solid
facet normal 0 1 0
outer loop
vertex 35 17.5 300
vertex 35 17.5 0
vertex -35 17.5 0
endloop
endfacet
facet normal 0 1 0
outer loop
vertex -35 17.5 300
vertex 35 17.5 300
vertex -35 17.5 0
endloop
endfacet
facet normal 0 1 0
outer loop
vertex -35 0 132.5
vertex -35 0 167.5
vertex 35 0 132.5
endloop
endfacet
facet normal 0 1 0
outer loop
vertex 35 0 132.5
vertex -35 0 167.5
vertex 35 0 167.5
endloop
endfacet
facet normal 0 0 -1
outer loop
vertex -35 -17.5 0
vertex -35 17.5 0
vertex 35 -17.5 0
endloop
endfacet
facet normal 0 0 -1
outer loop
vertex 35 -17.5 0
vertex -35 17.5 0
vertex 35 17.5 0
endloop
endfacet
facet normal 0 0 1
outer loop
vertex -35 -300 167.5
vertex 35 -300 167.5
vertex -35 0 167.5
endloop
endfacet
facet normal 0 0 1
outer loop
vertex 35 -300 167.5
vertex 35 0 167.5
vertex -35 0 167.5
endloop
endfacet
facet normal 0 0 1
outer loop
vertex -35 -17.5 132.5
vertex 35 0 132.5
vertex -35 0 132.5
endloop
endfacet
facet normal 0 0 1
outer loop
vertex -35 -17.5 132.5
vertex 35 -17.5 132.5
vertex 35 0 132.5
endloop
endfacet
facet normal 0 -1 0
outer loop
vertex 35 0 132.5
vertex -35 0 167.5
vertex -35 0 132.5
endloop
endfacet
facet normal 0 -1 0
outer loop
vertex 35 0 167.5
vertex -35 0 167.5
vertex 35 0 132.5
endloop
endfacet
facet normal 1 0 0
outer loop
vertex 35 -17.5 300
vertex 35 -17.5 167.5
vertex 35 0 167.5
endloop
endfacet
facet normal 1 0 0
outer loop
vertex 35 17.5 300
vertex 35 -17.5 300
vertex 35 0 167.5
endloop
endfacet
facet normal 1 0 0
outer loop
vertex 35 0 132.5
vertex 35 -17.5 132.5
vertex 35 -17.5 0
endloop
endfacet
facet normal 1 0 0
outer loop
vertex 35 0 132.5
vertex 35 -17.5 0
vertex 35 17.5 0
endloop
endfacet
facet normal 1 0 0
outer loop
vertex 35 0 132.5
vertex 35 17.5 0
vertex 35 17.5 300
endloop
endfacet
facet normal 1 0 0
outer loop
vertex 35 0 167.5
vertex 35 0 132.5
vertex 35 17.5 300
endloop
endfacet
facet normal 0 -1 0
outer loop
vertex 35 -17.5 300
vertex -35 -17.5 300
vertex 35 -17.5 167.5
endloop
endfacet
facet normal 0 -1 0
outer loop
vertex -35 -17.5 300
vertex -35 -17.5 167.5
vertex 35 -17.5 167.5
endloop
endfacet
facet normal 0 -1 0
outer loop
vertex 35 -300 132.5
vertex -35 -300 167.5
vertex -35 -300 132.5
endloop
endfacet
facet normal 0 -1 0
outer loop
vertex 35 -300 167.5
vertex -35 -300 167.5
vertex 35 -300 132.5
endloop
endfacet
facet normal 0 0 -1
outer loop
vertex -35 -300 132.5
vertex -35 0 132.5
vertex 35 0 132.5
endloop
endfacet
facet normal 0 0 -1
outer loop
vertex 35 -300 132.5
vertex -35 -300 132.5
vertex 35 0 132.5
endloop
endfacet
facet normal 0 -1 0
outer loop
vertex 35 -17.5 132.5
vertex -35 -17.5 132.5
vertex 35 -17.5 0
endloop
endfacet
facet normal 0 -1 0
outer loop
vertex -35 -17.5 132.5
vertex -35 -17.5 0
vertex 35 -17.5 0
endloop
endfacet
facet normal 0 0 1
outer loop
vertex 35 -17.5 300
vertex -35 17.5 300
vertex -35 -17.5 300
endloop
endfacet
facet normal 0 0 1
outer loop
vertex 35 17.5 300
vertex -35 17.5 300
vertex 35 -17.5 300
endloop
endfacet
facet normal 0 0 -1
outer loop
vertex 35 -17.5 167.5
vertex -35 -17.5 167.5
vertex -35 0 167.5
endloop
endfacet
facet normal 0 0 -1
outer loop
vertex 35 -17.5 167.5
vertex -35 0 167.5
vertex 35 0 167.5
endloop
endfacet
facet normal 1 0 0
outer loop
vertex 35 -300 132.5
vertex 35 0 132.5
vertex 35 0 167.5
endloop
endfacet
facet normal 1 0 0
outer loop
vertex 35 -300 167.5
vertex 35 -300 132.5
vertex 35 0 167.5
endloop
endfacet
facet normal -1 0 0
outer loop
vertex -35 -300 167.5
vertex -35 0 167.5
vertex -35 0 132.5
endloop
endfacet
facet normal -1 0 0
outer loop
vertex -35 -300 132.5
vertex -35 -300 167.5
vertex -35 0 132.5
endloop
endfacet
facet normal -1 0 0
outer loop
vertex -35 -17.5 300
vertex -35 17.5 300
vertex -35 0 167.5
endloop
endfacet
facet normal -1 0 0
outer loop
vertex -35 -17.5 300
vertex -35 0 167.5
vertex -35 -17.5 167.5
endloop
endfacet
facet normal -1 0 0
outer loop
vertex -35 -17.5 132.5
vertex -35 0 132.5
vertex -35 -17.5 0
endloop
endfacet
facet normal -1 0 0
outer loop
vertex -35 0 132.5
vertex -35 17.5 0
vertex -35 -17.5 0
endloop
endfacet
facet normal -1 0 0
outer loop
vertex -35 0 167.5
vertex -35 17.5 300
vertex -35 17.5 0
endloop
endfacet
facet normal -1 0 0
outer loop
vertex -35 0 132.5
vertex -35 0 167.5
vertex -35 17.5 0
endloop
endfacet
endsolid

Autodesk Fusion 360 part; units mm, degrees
sketch "Base" plane through (0, 0, 0) normal (0, 0, 1) x (1, 0, 0)
  line L0 (35, 17.5) -> (-35, 17.5)
  line L1 (-35, 17.5) -> (-35, -17.5)
  line L2 (-35, -17.5) -> (35, -17.5)
  line L3 (35, -17.5) -> (35, 17.5)
  line L4 (35, 17.5) -> (-35, -17.5) construction
  line L5 (-35, 17.5) -> (35, -17.5) construction
  dimension "d1" = 70
  dimension "d2" = 35
extrude "Extrude1" add sketch "Base" along normal blind 300 makes body 1
sketch "Cut" plane through (0, -17.5, 0) normal (0, -1, 0) x (1, 0, 0)
  line L0 (-35, 0) -> (35, 0)
  line L1 (35, 0) -> (35, 300)
  line L2 (35, 300) -> (-35, 300)
  line L3 (-35, 300) -> (-35, 0)
  line L4 (-35, 167.5) -> (35, 167.5)
  line L5 (35, 167.5) -> (35, 132.5)
  line L6 (35, 132.5) -> (-35, 132.5)
  line L7 (-35, 132.5) -> (-35, 167.5)
  dimension "d5" = 70
  dimension "d6" = 35
extrude "Extrude2" cut sketch "Cut" against normal blind 17.5 contours L1 L3 L4 L5 L6 L7 bodies 1
sketch "Horizontal Piece" plane through (0, 0, 0) normal (0, -1, 0) x (1, 0, 0)
  line L0 (-35, 132.5) -> (35, 132.5)
  line L1 (35, 132.5) -> (35, 167.5)
  line L2 (35, 167.5) -> (-35, 167.5)
  line L3 (-35, 167.5) -> (-35, 132.5)
  line L4 (-35, 167.5) -> (35, 167.5)
  line L5 (35, 167.5) -> (35, 132.5)
  line L6 (35, 132.5) -> (-35, 132.5)
  line L7 (-35, 132.5) -> (-35, 167.5)
extrude "Extrude1'" add sketch "Horizontal Piece" along normal blind 300 separate body makes body 2 in component "Horizontal Piece"
copy_body "Body->Comp1" bodies 1 removing the originals makes body 3 in component "Vertical Piece"
component "Horizontal Piece" placed x (1, 0, 0) y (0, 1, 0) z (0, 0, 1) at (0, 0, 0)
component "Vertical Piece" placed x (1, 0, 0) y (0, 1, 0) z (0, 0, 1) at (0, 0, 0)
equation "d7 = ( -35 / 2 ) * 1 mm"
